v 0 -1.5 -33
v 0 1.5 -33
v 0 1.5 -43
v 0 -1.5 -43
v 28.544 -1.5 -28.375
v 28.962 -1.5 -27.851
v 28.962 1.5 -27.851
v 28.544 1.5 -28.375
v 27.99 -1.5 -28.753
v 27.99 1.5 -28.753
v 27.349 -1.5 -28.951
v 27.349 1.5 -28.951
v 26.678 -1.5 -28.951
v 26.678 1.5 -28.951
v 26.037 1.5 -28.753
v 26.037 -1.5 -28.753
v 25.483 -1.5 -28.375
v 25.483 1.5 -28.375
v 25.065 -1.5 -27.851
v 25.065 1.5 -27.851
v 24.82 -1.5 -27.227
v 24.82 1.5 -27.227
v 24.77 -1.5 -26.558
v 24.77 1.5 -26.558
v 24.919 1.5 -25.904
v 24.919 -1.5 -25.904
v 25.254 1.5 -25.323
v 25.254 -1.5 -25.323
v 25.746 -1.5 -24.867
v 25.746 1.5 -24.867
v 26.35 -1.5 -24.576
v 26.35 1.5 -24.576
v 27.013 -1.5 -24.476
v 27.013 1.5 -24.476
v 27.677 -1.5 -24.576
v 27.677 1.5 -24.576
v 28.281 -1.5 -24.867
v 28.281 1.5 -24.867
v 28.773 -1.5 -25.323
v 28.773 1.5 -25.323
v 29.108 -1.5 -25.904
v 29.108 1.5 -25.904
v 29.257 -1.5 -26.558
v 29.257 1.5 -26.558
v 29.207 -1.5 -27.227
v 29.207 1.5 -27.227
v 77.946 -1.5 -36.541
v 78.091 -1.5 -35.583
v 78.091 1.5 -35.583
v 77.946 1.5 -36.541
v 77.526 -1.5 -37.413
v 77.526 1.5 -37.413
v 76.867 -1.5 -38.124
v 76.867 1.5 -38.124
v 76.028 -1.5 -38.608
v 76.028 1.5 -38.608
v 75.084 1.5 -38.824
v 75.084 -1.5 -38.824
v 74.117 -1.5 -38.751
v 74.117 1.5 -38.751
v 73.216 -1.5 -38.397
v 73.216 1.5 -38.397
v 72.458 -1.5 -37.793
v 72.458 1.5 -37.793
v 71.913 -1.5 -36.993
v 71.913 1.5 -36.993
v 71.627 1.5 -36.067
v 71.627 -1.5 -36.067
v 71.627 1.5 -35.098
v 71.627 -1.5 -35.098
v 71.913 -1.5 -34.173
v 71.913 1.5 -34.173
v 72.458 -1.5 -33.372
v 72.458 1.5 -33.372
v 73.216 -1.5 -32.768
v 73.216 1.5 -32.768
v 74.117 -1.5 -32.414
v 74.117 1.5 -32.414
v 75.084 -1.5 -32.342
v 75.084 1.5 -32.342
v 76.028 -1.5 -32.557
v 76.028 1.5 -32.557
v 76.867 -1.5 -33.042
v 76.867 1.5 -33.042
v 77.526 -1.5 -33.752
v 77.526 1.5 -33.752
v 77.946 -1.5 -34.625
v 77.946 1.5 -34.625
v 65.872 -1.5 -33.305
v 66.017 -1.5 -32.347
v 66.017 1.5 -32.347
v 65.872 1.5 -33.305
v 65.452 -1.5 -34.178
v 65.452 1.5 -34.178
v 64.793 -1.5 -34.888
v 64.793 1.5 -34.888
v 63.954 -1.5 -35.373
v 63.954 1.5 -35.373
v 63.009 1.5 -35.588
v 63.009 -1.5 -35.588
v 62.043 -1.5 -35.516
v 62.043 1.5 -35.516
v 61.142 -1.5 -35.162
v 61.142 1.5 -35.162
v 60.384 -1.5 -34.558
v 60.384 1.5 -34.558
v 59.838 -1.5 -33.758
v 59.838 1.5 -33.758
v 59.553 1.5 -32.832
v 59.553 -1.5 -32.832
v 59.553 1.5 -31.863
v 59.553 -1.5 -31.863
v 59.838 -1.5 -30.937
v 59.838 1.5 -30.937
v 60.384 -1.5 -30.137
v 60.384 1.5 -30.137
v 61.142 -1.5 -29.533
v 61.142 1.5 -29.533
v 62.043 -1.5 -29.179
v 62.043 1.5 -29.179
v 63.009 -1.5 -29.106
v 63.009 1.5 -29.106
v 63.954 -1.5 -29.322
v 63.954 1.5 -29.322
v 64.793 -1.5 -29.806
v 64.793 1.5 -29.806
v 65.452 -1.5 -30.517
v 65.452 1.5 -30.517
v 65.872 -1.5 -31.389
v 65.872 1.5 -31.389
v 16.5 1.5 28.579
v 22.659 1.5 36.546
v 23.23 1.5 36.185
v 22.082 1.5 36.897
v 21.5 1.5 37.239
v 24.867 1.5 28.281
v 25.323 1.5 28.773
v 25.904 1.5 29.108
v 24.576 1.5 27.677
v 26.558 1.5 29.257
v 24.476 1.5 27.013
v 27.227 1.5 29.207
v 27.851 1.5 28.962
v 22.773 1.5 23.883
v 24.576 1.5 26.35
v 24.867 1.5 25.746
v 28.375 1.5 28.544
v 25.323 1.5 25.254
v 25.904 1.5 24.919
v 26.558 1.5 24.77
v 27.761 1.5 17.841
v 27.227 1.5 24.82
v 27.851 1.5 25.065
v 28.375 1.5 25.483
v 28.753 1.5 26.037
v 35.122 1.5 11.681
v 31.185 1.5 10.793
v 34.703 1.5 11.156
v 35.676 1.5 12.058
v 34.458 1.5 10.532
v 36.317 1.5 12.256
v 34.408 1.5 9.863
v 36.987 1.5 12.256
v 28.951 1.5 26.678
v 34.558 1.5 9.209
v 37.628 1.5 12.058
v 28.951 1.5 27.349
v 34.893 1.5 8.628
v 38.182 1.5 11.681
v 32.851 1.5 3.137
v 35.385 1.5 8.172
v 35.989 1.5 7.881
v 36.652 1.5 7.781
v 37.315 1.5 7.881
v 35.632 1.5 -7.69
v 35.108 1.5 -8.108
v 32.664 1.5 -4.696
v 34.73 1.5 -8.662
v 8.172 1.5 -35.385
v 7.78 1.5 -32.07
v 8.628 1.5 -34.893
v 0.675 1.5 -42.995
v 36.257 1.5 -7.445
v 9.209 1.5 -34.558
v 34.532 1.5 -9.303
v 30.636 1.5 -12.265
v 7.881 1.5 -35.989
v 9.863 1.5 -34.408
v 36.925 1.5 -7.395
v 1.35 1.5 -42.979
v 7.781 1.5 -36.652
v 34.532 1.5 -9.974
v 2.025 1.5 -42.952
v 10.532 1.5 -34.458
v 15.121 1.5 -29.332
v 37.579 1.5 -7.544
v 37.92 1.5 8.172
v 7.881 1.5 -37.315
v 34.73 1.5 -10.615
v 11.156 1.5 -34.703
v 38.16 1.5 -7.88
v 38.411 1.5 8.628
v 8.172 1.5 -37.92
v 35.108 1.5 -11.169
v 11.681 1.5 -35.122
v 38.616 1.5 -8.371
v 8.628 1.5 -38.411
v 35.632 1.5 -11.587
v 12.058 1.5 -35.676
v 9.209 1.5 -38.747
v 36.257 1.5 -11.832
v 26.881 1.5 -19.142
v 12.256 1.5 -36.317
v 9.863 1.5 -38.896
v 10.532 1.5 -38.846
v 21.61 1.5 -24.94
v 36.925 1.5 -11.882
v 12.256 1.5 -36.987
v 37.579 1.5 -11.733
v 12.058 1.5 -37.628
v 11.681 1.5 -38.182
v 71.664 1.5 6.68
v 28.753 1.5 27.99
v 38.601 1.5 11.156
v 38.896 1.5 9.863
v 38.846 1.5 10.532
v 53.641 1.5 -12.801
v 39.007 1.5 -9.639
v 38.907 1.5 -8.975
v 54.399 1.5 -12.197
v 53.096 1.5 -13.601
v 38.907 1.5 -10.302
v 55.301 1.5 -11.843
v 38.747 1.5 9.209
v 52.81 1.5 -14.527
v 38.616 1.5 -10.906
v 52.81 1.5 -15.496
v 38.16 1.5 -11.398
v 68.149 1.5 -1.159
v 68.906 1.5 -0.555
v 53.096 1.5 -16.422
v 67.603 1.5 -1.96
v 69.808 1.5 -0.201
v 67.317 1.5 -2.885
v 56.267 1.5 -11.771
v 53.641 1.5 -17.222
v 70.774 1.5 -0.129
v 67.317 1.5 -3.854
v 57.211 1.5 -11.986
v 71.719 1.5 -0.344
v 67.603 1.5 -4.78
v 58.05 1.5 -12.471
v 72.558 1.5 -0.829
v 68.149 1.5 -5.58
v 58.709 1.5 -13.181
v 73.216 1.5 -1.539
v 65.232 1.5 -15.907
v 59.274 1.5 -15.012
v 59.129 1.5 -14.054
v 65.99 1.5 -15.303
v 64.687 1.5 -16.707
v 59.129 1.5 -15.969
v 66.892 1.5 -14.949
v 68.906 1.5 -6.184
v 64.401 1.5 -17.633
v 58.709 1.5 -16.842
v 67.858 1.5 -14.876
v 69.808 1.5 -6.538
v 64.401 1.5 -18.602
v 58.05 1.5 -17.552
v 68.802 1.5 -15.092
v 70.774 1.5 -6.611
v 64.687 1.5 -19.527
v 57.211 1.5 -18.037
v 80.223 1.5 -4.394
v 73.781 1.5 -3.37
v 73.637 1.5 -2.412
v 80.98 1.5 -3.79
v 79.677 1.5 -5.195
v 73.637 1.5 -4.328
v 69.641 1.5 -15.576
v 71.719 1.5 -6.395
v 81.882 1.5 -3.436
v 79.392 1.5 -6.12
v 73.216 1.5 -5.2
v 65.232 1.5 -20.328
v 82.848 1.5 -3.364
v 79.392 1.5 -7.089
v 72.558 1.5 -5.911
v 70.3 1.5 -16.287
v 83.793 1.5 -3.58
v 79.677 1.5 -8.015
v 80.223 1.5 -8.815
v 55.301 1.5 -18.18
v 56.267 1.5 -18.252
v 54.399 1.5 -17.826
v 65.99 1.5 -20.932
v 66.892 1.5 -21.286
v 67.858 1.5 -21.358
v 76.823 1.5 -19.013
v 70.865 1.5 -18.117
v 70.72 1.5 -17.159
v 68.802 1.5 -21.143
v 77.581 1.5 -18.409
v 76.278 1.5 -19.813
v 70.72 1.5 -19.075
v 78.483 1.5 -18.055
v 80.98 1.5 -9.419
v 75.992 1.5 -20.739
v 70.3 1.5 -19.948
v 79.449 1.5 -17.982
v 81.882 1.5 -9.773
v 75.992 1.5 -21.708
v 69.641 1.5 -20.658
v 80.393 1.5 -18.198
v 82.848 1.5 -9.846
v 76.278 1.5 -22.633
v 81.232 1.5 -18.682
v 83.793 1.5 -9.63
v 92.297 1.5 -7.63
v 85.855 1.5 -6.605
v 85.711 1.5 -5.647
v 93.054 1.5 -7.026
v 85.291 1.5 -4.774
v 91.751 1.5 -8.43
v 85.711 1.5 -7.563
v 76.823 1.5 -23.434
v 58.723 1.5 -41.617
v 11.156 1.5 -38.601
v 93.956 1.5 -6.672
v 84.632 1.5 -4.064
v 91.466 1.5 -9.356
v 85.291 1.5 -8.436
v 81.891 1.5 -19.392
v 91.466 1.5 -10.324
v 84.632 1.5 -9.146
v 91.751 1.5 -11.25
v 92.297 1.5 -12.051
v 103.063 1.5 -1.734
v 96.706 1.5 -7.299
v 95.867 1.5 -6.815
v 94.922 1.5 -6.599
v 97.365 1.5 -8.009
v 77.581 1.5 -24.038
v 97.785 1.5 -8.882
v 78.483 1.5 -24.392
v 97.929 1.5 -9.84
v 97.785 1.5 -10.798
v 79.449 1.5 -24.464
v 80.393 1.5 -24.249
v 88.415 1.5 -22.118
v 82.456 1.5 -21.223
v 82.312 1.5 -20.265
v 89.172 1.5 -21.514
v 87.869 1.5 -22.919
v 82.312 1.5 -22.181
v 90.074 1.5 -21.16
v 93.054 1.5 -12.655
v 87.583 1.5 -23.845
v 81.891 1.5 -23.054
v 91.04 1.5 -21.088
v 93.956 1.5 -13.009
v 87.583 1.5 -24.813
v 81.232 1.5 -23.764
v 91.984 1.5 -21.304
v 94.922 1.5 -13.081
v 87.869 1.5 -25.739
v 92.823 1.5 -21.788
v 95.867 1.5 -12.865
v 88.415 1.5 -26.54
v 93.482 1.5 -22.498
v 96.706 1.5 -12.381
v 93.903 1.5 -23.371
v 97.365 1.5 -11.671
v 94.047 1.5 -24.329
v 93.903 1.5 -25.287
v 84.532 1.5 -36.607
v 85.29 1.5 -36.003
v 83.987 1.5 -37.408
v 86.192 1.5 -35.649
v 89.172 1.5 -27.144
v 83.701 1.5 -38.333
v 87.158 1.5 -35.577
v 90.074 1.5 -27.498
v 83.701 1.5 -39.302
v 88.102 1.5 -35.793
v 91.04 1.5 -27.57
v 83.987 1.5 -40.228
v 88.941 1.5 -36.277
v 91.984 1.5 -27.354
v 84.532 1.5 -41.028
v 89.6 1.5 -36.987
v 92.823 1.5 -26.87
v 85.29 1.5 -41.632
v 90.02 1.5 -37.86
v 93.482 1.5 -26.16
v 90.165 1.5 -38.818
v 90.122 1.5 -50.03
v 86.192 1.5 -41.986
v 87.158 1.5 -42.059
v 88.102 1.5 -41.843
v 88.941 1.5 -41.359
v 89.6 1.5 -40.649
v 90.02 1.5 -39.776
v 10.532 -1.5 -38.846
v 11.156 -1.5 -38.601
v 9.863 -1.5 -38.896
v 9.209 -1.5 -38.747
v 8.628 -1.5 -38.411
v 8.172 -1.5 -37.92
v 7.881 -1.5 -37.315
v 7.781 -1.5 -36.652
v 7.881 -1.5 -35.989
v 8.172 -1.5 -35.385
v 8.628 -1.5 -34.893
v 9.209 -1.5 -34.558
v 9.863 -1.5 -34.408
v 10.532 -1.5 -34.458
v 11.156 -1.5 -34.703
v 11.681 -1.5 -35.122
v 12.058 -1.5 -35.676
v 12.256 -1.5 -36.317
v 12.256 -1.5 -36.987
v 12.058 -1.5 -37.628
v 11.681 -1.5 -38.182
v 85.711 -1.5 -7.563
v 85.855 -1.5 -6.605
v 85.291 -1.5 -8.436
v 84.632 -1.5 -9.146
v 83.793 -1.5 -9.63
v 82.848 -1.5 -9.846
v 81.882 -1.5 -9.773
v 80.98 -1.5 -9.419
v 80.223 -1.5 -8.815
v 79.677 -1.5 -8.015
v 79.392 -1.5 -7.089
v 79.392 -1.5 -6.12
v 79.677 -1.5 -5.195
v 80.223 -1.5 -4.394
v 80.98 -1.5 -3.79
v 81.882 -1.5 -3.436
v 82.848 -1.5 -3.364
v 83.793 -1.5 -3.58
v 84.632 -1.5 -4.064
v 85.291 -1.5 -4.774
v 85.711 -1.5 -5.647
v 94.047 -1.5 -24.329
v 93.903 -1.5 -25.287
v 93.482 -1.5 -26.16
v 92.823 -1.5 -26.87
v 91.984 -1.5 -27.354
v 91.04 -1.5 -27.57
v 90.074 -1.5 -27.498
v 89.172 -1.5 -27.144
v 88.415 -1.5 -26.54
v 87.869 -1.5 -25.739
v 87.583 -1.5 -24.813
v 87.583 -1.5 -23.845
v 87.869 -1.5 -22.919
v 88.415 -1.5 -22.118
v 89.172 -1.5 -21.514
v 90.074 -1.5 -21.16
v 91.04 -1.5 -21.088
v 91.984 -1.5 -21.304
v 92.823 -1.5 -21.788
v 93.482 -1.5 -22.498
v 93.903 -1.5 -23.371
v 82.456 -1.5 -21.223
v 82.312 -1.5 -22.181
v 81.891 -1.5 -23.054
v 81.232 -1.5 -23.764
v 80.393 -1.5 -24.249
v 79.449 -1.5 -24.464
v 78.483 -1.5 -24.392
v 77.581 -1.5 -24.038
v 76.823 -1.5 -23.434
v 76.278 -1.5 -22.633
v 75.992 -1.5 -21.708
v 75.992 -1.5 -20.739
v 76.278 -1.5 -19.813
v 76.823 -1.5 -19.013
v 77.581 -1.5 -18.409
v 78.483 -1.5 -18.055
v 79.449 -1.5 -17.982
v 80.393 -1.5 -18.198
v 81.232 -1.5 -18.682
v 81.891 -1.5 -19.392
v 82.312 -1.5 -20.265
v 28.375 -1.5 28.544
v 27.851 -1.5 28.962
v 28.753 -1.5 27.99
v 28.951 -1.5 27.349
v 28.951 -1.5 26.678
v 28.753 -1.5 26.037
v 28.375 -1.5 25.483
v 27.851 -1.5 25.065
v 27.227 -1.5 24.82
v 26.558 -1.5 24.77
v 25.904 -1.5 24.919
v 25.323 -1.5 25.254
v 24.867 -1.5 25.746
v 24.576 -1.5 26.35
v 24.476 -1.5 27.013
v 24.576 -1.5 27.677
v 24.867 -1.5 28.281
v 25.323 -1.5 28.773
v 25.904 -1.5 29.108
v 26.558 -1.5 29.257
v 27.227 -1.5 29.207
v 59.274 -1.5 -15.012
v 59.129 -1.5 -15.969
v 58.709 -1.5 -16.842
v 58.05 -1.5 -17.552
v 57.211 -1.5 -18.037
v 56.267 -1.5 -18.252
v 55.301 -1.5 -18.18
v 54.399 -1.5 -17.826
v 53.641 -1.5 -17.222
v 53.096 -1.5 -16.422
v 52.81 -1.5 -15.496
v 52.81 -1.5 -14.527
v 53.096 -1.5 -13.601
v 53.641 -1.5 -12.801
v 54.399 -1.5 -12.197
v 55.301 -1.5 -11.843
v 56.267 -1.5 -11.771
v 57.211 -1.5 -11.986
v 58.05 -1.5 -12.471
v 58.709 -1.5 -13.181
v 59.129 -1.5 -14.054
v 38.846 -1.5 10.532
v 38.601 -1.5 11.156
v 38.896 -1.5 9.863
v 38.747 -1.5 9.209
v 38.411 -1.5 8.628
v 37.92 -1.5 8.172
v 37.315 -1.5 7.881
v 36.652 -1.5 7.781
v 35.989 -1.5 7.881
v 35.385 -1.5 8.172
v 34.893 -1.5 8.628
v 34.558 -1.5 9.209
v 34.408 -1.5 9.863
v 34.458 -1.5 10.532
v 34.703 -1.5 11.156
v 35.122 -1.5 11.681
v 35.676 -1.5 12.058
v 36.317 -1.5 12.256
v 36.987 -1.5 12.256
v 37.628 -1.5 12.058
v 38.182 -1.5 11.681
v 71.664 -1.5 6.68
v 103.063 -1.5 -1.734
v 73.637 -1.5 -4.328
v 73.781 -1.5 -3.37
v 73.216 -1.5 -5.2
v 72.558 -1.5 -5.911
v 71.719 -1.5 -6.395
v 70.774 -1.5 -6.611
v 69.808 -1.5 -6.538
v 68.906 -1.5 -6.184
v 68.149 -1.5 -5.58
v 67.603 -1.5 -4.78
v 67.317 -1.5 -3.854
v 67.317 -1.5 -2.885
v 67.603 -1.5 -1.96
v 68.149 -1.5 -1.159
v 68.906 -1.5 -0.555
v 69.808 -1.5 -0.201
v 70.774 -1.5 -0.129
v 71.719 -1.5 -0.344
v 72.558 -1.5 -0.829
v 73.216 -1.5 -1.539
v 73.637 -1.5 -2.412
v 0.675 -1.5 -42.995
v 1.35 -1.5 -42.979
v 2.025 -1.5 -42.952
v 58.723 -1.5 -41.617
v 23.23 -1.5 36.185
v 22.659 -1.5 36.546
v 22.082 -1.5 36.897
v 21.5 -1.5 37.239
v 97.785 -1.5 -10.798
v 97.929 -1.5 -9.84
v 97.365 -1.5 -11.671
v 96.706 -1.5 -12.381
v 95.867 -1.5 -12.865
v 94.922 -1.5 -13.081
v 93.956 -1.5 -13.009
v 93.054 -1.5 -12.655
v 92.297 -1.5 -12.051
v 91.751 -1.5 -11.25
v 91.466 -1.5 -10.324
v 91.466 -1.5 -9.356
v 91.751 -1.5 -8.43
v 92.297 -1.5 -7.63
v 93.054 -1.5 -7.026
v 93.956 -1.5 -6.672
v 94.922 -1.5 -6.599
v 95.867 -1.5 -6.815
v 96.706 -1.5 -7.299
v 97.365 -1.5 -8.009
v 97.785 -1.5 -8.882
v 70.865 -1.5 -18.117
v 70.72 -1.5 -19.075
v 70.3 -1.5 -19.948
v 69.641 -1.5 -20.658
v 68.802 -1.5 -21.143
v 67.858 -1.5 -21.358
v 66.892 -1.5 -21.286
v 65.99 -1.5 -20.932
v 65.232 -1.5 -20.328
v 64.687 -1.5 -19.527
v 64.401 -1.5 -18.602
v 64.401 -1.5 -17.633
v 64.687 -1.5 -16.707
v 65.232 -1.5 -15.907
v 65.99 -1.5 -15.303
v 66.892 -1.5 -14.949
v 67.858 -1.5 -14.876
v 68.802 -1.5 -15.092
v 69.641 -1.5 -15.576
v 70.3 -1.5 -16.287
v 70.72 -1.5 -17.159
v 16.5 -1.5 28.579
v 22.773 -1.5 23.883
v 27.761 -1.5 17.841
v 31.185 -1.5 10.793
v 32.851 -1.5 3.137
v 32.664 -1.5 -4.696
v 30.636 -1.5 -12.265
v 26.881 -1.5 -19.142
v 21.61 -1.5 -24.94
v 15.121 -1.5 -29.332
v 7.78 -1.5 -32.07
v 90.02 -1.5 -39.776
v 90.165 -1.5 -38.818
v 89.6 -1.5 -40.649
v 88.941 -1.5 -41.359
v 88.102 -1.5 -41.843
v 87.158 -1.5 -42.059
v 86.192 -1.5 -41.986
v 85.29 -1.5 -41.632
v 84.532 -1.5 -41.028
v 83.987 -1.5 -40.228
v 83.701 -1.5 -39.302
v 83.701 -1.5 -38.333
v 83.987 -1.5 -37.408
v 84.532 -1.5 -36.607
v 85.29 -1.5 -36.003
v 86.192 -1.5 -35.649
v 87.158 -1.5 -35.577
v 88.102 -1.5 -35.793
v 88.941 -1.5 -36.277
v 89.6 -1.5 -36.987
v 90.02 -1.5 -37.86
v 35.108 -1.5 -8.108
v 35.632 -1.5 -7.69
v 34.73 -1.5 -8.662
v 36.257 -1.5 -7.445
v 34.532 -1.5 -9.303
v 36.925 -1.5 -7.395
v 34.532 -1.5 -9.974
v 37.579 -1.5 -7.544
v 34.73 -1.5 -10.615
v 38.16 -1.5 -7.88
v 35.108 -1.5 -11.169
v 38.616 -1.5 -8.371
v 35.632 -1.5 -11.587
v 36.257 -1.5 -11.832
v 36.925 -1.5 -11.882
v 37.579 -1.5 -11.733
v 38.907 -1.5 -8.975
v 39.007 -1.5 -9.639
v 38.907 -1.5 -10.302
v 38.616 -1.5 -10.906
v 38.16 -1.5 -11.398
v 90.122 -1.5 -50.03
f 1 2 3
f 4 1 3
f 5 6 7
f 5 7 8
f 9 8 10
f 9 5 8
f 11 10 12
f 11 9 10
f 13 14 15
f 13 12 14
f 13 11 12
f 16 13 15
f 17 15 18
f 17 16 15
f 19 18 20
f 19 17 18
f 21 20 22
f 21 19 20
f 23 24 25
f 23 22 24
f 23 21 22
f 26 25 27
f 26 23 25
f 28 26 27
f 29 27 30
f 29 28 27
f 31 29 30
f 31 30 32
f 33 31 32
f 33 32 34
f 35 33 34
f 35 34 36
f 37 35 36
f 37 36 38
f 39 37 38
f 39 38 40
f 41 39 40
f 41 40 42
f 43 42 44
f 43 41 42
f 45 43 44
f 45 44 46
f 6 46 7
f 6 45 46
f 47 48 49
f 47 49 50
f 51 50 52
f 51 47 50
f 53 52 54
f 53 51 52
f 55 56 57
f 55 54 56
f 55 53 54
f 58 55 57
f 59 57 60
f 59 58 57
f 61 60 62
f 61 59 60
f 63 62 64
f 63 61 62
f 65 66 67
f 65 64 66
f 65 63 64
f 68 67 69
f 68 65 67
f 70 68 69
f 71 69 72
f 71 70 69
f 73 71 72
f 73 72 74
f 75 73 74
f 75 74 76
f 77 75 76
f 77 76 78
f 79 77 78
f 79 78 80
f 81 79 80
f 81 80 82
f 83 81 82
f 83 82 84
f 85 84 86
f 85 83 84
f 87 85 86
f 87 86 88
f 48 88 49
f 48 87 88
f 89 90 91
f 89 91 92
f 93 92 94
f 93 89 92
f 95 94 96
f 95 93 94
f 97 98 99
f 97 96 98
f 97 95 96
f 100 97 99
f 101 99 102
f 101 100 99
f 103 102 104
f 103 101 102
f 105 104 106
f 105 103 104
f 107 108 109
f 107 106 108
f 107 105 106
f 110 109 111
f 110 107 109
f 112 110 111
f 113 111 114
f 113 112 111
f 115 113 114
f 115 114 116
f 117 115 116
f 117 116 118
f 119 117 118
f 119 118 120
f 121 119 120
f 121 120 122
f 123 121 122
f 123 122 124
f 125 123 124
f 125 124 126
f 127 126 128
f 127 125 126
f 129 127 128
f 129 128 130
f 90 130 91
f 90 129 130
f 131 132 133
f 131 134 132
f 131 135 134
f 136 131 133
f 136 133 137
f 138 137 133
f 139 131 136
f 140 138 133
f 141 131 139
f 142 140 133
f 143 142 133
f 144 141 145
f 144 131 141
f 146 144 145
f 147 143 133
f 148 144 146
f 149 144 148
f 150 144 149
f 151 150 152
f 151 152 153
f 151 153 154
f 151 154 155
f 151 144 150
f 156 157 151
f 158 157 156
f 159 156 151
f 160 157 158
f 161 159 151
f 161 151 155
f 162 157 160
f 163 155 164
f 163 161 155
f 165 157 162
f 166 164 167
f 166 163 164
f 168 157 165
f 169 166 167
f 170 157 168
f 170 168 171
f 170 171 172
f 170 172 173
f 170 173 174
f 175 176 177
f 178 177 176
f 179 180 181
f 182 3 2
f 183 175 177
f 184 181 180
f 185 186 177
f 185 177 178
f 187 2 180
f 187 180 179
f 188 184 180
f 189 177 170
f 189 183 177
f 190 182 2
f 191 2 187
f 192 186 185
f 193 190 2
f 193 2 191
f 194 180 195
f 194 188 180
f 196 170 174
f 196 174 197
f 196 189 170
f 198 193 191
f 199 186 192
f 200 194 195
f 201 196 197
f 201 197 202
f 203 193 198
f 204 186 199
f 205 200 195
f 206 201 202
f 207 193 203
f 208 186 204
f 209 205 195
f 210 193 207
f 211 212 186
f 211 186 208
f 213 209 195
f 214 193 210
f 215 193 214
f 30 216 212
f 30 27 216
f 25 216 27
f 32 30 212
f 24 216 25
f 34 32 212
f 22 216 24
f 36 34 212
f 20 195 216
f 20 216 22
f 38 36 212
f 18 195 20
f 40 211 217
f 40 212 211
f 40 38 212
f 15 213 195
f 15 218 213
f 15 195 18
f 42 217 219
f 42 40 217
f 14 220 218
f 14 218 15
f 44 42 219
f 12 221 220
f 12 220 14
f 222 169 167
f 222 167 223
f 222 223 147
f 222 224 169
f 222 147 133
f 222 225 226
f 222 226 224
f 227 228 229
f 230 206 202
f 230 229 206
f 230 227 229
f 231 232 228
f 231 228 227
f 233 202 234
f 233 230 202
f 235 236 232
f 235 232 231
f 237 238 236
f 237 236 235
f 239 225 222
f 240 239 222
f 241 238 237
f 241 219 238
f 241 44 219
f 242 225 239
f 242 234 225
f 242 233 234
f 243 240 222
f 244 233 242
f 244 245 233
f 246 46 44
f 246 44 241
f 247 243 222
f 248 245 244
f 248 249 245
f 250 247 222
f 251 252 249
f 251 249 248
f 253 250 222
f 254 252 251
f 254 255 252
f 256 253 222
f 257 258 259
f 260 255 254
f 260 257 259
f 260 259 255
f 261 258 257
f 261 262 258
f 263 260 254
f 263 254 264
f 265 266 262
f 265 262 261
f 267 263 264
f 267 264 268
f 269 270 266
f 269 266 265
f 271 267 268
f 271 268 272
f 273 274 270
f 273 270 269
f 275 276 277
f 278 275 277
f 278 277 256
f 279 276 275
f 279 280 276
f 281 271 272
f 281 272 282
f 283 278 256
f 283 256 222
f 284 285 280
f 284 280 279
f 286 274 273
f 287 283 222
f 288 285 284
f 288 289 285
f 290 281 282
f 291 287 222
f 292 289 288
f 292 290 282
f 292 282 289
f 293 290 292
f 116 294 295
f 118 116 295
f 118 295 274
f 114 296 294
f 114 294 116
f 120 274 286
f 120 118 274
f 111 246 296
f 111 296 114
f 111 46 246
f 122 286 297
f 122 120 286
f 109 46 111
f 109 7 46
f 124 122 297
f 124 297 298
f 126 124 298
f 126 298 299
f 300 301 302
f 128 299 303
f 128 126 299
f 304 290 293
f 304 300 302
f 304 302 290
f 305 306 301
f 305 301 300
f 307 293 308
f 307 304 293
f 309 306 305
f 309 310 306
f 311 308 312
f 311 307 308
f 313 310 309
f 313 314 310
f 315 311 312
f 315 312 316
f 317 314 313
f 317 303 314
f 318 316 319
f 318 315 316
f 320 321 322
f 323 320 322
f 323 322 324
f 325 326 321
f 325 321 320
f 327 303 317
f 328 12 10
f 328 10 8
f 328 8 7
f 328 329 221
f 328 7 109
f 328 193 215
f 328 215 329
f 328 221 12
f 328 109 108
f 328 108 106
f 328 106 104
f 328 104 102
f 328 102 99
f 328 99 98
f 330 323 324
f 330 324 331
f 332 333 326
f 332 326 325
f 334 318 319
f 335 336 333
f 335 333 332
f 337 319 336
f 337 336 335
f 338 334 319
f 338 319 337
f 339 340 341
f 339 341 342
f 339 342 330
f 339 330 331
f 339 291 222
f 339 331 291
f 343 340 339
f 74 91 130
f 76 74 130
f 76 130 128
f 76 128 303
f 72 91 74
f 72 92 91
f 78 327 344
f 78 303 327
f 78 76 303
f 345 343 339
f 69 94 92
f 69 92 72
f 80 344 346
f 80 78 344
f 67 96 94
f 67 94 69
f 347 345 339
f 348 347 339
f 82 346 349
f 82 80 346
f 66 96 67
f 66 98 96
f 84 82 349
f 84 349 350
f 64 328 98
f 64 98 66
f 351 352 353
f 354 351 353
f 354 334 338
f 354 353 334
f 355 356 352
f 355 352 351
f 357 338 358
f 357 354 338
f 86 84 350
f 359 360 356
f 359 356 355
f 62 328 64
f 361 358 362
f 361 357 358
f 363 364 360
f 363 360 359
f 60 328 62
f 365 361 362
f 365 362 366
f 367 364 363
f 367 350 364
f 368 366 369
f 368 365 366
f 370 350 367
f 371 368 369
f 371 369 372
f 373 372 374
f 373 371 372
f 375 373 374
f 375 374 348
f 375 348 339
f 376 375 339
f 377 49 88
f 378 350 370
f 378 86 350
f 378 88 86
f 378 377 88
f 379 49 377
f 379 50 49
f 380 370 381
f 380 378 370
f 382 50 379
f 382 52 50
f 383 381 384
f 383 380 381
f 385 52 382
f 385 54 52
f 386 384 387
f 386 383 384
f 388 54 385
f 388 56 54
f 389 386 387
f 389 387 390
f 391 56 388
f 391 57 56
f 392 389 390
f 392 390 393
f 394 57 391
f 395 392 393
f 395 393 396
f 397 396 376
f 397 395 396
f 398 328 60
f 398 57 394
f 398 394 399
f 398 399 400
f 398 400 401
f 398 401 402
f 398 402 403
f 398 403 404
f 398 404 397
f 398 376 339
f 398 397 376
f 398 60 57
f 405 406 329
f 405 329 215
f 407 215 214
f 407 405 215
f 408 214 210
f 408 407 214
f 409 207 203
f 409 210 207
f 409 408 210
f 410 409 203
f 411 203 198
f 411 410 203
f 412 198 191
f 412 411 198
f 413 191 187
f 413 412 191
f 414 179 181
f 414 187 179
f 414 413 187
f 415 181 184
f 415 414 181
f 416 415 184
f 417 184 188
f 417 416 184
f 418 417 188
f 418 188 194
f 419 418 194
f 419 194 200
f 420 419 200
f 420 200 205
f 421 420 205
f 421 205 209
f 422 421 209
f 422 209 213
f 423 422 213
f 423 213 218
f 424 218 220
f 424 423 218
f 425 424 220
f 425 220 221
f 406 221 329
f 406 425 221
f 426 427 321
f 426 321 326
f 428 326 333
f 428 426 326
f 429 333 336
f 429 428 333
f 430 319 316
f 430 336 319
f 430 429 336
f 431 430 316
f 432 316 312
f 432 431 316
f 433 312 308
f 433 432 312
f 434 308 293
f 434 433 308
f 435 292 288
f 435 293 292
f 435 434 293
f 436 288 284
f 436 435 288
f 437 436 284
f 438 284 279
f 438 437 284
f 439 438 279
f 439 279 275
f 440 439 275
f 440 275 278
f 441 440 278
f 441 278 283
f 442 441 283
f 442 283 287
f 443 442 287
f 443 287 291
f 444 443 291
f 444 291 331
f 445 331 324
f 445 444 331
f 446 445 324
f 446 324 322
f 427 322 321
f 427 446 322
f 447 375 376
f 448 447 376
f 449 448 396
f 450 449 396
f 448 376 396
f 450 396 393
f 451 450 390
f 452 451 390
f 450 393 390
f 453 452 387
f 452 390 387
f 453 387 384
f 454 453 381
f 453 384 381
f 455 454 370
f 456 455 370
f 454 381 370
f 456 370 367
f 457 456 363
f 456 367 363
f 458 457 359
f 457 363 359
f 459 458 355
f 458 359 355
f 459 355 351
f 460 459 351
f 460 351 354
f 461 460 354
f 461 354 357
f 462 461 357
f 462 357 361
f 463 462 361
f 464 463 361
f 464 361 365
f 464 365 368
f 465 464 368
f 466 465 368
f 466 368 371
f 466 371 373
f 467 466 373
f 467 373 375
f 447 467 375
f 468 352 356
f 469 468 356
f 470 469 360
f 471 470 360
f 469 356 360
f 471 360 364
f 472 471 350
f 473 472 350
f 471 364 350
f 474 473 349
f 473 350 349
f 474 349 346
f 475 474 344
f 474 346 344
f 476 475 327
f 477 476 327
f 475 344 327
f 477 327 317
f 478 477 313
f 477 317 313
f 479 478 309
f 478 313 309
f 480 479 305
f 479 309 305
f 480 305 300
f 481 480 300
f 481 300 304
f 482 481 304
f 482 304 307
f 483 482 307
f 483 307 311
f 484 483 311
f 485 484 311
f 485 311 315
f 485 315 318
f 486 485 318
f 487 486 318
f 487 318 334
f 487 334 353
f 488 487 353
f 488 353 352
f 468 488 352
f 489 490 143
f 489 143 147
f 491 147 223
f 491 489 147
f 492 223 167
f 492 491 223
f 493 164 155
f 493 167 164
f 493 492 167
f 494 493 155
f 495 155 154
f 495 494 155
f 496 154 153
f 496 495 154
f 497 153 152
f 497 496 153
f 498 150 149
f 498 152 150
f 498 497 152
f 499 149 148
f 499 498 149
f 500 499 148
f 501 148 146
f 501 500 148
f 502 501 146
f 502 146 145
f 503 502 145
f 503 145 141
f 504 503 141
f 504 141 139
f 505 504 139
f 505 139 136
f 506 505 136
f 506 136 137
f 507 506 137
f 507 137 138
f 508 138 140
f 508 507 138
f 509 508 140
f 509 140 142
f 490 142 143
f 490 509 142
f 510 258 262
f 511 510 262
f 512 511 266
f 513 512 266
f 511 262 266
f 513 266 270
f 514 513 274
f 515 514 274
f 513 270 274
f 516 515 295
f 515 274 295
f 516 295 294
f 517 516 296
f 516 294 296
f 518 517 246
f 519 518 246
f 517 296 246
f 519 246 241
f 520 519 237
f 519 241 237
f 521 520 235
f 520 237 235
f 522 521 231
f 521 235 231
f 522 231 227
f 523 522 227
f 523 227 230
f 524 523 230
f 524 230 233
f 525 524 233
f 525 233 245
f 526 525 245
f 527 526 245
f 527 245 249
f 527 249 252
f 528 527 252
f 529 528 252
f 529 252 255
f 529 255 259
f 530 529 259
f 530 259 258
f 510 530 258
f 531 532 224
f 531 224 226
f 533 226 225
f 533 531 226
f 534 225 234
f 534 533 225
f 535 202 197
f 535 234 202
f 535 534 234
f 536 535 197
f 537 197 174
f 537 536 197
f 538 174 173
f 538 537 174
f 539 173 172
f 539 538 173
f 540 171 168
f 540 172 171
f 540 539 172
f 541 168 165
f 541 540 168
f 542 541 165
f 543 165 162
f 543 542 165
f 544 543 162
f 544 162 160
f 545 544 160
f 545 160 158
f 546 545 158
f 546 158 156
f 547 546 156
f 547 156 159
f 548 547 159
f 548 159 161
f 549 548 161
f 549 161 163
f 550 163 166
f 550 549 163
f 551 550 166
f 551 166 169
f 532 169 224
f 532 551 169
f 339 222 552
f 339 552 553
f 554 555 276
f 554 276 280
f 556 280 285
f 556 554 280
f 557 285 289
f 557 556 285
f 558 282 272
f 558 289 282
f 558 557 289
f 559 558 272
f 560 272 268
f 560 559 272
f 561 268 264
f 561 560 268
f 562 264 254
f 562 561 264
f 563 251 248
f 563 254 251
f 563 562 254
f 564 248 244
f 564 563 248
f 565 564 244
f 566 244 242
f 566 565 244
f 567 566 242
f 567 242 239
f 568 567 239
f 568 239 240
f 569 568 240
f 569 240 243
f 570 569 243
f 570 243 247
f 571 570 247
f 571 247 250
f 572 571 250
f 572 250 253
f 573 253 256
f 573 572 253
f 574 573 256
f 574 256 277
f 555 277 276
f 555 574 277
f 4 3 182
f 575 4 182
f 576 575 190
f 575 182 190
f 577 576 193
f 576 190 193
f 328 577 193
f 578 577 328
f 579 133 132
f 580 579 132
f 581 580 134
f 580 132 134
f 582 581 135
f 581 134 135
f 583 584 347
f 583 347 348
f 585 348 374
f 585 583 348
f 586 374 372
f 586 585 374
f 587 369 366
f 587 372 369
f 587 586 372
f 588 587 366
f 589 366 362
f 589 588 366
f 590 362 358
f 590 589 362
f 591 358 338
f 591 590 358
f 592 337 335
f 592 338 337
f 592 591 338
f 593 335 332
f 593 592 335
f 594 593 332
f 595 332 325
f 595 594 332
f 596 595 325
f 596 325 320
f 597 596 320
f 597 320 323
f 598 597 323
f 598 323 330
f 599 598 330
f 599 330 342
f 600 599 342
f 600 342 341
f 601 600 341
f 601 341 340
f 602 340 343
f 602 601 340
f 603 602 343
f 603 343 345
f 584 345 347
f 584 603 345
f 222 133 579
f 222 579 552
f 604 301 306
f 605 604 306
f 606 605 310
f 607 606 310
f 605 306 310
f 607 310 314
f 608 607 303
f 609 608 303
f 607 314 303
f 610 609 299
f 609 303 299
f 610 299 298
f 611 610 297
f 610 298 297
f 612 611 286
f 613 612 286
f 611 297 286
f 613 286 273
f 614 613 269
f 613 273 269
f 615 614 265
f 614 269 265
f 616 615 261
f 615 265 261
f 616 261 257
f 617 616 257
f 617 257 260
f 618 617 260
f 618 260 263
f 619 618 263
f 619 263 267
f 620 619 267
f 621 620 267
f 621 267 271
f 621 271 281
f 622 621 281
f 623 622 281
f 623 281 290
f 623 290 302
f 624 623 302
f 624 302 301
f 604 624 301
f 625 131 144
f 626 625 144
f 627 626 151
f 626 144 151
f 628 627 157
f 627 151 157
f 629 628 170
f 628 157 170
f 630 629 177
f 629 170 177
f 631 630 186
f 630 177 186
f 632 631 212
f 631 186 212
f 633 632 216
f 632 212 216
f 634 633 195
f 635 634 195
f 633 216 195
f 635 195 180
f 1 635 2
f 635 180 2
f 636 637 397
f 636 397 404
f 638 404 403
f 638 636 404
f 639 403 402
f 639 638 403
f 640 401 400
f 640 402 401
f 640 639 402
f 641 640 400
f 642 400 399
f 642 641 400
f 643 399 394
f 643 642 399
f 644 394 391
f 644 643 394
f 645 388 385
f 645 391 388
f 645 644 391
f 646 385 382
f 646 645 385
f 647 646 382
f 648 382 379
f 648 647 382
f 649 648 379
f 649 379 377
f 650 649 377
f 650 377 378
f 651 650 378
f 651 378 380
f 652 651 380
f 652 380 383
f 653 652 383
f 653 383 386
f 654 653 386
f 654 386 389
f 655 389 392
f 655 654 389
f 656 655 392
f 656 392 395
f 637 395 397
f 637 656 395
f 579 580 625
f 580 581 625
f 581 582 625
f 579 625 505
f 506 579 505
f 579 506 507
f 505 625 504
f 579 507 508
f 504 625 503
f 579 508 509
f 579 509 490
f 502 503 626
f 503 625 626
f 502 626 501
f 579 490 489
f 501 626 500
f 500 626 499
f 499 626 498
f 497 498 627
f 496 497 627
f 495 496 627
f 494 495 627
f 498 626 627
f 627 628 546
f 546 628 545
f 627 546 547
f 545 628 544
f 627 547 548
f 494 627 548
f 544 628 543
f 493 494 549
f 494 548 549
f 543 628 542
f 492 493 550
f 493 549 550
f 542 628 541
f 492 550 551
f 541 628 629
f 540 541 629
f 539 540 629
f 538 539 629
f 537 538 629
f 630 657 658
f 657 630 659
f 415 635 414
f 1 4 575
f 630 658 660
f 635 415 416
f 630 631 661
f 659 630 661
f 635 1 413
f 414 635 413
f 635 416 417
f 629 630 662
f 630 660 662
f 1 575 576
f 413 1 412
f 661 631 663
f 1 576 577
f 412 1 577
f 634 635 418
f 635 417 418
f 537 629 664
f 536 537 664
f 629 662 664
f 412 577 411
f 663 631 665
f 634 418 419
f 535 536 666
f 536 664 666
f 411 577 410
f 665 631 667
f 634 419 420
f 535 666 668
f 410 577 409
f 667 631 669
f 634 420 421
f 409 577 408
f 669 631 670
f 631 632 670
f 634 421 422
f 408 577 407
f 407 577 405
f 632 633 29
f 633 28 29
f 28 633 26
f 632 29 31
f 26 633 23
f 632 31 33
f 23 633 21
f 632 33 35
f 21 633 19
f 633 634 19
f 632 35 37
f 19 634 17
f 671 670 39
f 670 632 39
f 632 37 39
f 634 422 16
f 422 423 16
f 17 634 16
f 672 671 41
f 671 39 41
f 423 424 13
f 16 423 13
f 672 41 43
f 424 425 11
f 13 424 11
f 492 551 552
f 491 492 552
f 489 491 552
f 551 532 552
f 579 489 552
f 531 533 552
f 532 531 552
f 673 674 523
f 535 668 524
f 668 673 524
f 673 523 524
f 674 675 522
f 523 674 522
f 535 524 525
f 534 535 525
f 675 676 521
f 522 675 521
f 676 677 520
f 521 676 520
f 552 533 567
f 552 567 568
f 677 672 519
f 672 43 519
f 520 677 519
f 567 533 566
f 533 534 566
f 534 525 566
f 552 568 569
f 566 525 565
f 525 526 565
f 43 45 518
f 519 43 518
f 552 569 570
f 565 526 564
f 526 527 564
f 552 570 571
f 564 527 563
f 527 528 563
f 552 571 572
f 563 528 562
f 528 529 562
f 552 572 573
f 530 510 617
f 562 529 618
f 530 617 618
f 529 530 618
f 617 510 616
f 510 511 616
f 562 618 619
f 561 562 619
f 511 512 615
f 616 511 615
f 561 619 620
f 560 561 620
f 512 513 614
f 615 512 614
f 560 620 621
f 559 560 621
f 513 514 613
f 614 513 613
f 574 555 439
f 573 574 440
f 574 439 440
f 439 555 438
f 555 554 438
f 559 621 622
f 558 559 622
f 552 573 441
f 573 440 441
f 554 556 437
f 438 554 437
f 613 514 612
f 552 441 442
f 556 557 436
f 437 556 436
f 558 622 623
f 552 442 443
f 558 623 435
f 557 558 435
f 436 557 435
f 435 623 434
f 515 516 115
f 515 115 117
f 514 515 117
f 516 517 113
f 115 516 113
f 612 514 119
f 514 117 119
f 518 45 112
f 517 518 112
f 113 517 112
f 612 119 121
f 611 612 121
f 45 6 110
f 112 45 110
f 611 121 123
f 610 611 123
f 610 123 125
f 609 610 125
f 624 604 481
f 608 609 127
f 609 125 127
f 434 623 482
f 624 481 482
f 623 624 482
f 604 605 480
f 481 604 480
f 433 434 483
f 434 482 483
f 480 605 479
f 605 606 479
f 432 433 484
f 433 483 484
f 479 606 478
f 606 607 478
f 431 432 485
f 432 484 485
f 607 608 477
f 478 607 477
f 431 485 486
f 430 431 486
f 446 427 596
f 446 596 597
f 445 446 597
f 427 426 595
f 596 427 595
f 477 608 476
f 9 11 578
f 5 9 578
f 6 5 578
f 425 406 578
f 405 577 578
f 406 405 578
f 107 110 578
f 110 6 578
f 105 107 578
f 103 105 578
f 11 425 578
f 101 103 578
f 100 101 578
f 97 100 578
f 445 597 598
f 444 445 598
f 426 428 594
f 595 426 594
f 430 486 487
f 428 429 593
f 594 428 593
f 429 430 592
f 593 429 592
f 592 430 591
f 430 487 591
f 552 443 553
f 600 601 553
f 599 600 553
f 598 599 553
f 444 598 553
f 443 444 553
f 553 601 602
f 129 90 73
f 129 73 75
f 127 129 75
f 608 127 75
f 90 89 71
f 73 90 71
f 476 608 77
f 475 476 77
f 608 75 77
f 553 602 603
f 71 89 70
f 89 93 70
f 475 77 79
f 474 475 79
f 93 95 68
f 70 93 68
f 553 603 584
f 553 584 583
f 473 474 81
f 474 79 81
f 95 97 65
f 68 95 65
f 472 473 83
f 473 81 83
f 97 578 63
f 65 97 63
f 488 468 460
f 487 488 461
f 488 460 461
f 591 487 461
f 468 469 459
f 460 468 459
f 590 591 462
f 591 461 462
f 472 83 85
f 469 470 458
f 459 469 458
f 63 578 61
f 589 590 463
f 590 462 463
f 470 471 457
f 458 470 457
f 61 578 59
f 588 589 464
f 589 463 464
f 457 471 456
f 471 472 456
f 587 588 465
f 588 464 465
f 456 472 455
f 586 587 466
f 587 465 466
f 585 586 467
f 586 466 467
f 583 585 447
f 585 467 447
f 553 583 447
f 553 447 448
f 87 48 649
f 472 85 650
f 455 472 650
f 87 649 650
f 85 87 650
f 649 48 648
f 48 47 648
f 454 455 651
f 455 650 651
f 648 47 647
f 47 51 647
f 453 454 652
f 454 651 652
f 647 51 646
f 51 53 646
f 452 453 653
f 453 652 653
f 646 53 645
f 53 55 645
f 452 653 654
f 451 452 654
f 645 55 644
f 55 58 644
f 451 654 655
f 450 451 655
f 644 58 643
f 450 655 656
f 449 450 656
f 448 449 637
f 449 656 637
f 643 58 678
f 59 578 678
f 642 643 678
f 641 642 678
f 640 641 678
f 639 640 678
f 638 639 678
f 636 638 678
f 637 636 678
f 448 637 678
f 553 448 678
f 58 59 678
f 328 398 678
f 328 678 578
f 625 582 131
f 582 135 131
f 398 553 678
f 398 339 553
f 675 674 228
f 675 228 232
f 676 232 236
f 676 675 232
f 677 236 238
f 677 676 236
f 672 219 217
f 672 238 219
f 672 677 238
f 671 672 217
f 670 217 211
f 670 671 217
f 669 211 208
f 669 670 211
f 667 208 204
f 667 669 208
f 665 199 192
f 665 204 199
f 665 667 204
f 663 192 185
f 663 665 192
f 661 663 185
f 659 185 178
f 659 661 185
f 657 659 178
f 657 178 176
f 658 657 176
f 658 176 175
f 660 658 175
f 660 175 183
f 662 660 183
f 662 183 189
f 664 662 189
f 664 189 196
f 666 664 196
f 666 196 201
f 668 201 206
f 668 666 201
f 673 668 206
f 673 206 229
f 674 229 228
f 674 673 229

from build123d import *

# Parameters (mm, degrees)
BOSS_EXTRUDE1_DEPTH             = 1.5
BOSS_EXTRUDE2_DEPTH             = 1.5
BOSS_EXTRUDE3_DEPTH             = 1.5
CUT_EXTRUDE1_START              = -4
SKETCH2_R                       = 2.25
CUT_EXTRUDE1_DEPTH              = 5
CIRPATTERN1_COUNT               = 3
CIRPATTERN1_ANGLE               = 60
CIRPATTERN1_THE_OTHER_WAY_COUNT = 3
CIRPATTERN1_THE_OTHER_WAY_ANGLE = 60
CUT_EXTRUDE2_START              = -4
SKETCH6_R                       = 3.25
CUT_EXTRUDE2_DEPTH              = 5
LPATTERN1_COUNT                 = 3
LPATTERN1_PITCH                 = 12.5
SKETCH7_R                       = 3.25
CUT_EXTRUDE3_DEPTH              = 10
LPATTERN2_COUNT                 = 4
LPATTERN2_PITCH                 = 12


with BuildPart() as part:
    # Sketch1 → Boss-Extrude1 (new body, symmetric)
    with BuildSketch(Plane(origin=(0, 0, 0), x_dir=(1, 0, 0), z_dir=(0, 1, 0))):
        with BuildLine():
            Line((0, 33), (0, 43))
            ThreePointArc((0, 43), (41.53481053, 11.129218939), (21.5, -37.239092363))
            Line((21.5, -37.239092363), (16.5, -28.578838325))
            ThreePointArc((16.5, -28.578838325), (31.875552268, 8.541028488), (0, 33))
        make_face()
    extrude(amount=BOSS_EXTRUDE1_DEPTH, both=True)

    # Sketch4 → Boss-Extrude2 (add, symmetric)
    with BuildSketch(Plane(origin=(0, 0, 0), x_dir=(1, 0, 0), z_dir=(0, 1, 0))):
        Polygon((90.122106501, 50.030050167), (25.40507614, 32.689174146), (38.346028395, -15.607117169), (103.063058756, 1.733758853), align=None)
    extrude(amount=BOSS_EXTRUDE2_DEPTH, both=True)

    # Sketch5 → Boss-Extrude3 (add, symmetric)
    with BuildSketch(Plane(origin=(0, 0, 0), x_dir=(1, 0, 0), z_dir=(0, 1, 0))):
        Polygon((0, 43), (58.722616268, 41.616582117), (27.323126035, 33.203114066), align=None)
        Polygon((71.663568523, -6.679709198), (40.26407829, -15.093177248), (21.5, -37.239092363), align=None)
    extrude(amount=BOSS_EXTRUDE3_DEPTH, both=True)

    # Sketch2 → Cut-Extrude1 (cut)
    with BuildSketch(Plane(origin=(0, 1.5, 0), x_dir=(1, 0, 0), z_dir=(0, 1, 0)).offset(CUT_EXTRUDE1_START)):
        with Locations((36.757261811, 9.638656763)):
            Circle(SKETCH2_R)
    cut_extrude1 = extrude(amount=CUT_EXTRUDE1_DEPTH, mode=Mode.SUBTRACT)

    # CirPattern1: Cut-Extrude1 ×3 about axis
    cirpattern1_axis = Axis((0, 0, 0), (0, -1, 0))
    for i in range(1, CIRPATTERN1_COUNT):
        add(cut_extrude1.rotate(cirpattern1_axis, i * CIRPATTERN1_ANGLE / (CIRPATTERN1_COUNT - 1)), mode=Mode.SUBTRACT)

    # CirPattern1 the other way: Cut-Extrude1 ×3 about axis
    cirpattern1_the_other_way_axis = Axis((0, 0, 0), (0, 1, 0))
    for i in range(1, CIRPATTERN1_THE_OTHER_WAY_COUNT):
        add(cut_extrude1.rotate(cirpattern1_the_other_way_axis, i * CIRPATTERN1_THE_OTHER_WAY_ANGLE / (CIRPATTERN1_THE_OTHER_WAY_COUNT - 1)), mode=Mode.SUBTRACT)

    # Sketch6 → Cut-Extrude2 (cut)
    with BuildSketch(Plane(origin=(0, 1.5, 0), x_dir=(1, 0, 0), z_dir=(0, 1, 0)).offset(CUT_EXTRUDE2_START)):
        with Locations((94.679313348, 9.840102845)):
            Circle(SKETCH6_R)
        with Locations((86.914741995, 38.817877634)):
            Circle(SKETCH6_R)
    cut_extrude2 = extrude(amount=CUT_EXTRUDE2_DEPTH, mode=Mode.SUBTRACT)

    # LPattern1: Cut-Extrude2 ×3
    with Locations(*[Vector(-0.965925826, 0, 0.258819045) * (i * LPATTERN1_PITCH) for i in range(1, LPATTERN1_COUNT)]):
        add(cut_extrude2, mode=Mode.SUBTRACT)

    # Sketch7 → Cut-Extrude3 (cut)
    with BuildSketch(Plane(origin=(0, 1.5, 0), x_dir=(1, 0, 0), z_dir=(0, 1, 0))):
        with Locations((90.797027671, 24.32899024)):
            Circle(SKETCH7_R)
    cut_extrude3 = extrude(amount=-CUT_EXTRUDE3_DEPTH, mode=Mode.SUBTRACT)

    # LPattern2: Cut-Extrude3 ×4
    with Locations(*[Vector(-0.965925826, 0, 0.258819045) * (i * LPATTERN2_PITCH) for i in range(1, LPATTERN2_COUNT)]):
        add(cut_extrude3, mode=Mode.SUBTRACT)


solid = part.part
